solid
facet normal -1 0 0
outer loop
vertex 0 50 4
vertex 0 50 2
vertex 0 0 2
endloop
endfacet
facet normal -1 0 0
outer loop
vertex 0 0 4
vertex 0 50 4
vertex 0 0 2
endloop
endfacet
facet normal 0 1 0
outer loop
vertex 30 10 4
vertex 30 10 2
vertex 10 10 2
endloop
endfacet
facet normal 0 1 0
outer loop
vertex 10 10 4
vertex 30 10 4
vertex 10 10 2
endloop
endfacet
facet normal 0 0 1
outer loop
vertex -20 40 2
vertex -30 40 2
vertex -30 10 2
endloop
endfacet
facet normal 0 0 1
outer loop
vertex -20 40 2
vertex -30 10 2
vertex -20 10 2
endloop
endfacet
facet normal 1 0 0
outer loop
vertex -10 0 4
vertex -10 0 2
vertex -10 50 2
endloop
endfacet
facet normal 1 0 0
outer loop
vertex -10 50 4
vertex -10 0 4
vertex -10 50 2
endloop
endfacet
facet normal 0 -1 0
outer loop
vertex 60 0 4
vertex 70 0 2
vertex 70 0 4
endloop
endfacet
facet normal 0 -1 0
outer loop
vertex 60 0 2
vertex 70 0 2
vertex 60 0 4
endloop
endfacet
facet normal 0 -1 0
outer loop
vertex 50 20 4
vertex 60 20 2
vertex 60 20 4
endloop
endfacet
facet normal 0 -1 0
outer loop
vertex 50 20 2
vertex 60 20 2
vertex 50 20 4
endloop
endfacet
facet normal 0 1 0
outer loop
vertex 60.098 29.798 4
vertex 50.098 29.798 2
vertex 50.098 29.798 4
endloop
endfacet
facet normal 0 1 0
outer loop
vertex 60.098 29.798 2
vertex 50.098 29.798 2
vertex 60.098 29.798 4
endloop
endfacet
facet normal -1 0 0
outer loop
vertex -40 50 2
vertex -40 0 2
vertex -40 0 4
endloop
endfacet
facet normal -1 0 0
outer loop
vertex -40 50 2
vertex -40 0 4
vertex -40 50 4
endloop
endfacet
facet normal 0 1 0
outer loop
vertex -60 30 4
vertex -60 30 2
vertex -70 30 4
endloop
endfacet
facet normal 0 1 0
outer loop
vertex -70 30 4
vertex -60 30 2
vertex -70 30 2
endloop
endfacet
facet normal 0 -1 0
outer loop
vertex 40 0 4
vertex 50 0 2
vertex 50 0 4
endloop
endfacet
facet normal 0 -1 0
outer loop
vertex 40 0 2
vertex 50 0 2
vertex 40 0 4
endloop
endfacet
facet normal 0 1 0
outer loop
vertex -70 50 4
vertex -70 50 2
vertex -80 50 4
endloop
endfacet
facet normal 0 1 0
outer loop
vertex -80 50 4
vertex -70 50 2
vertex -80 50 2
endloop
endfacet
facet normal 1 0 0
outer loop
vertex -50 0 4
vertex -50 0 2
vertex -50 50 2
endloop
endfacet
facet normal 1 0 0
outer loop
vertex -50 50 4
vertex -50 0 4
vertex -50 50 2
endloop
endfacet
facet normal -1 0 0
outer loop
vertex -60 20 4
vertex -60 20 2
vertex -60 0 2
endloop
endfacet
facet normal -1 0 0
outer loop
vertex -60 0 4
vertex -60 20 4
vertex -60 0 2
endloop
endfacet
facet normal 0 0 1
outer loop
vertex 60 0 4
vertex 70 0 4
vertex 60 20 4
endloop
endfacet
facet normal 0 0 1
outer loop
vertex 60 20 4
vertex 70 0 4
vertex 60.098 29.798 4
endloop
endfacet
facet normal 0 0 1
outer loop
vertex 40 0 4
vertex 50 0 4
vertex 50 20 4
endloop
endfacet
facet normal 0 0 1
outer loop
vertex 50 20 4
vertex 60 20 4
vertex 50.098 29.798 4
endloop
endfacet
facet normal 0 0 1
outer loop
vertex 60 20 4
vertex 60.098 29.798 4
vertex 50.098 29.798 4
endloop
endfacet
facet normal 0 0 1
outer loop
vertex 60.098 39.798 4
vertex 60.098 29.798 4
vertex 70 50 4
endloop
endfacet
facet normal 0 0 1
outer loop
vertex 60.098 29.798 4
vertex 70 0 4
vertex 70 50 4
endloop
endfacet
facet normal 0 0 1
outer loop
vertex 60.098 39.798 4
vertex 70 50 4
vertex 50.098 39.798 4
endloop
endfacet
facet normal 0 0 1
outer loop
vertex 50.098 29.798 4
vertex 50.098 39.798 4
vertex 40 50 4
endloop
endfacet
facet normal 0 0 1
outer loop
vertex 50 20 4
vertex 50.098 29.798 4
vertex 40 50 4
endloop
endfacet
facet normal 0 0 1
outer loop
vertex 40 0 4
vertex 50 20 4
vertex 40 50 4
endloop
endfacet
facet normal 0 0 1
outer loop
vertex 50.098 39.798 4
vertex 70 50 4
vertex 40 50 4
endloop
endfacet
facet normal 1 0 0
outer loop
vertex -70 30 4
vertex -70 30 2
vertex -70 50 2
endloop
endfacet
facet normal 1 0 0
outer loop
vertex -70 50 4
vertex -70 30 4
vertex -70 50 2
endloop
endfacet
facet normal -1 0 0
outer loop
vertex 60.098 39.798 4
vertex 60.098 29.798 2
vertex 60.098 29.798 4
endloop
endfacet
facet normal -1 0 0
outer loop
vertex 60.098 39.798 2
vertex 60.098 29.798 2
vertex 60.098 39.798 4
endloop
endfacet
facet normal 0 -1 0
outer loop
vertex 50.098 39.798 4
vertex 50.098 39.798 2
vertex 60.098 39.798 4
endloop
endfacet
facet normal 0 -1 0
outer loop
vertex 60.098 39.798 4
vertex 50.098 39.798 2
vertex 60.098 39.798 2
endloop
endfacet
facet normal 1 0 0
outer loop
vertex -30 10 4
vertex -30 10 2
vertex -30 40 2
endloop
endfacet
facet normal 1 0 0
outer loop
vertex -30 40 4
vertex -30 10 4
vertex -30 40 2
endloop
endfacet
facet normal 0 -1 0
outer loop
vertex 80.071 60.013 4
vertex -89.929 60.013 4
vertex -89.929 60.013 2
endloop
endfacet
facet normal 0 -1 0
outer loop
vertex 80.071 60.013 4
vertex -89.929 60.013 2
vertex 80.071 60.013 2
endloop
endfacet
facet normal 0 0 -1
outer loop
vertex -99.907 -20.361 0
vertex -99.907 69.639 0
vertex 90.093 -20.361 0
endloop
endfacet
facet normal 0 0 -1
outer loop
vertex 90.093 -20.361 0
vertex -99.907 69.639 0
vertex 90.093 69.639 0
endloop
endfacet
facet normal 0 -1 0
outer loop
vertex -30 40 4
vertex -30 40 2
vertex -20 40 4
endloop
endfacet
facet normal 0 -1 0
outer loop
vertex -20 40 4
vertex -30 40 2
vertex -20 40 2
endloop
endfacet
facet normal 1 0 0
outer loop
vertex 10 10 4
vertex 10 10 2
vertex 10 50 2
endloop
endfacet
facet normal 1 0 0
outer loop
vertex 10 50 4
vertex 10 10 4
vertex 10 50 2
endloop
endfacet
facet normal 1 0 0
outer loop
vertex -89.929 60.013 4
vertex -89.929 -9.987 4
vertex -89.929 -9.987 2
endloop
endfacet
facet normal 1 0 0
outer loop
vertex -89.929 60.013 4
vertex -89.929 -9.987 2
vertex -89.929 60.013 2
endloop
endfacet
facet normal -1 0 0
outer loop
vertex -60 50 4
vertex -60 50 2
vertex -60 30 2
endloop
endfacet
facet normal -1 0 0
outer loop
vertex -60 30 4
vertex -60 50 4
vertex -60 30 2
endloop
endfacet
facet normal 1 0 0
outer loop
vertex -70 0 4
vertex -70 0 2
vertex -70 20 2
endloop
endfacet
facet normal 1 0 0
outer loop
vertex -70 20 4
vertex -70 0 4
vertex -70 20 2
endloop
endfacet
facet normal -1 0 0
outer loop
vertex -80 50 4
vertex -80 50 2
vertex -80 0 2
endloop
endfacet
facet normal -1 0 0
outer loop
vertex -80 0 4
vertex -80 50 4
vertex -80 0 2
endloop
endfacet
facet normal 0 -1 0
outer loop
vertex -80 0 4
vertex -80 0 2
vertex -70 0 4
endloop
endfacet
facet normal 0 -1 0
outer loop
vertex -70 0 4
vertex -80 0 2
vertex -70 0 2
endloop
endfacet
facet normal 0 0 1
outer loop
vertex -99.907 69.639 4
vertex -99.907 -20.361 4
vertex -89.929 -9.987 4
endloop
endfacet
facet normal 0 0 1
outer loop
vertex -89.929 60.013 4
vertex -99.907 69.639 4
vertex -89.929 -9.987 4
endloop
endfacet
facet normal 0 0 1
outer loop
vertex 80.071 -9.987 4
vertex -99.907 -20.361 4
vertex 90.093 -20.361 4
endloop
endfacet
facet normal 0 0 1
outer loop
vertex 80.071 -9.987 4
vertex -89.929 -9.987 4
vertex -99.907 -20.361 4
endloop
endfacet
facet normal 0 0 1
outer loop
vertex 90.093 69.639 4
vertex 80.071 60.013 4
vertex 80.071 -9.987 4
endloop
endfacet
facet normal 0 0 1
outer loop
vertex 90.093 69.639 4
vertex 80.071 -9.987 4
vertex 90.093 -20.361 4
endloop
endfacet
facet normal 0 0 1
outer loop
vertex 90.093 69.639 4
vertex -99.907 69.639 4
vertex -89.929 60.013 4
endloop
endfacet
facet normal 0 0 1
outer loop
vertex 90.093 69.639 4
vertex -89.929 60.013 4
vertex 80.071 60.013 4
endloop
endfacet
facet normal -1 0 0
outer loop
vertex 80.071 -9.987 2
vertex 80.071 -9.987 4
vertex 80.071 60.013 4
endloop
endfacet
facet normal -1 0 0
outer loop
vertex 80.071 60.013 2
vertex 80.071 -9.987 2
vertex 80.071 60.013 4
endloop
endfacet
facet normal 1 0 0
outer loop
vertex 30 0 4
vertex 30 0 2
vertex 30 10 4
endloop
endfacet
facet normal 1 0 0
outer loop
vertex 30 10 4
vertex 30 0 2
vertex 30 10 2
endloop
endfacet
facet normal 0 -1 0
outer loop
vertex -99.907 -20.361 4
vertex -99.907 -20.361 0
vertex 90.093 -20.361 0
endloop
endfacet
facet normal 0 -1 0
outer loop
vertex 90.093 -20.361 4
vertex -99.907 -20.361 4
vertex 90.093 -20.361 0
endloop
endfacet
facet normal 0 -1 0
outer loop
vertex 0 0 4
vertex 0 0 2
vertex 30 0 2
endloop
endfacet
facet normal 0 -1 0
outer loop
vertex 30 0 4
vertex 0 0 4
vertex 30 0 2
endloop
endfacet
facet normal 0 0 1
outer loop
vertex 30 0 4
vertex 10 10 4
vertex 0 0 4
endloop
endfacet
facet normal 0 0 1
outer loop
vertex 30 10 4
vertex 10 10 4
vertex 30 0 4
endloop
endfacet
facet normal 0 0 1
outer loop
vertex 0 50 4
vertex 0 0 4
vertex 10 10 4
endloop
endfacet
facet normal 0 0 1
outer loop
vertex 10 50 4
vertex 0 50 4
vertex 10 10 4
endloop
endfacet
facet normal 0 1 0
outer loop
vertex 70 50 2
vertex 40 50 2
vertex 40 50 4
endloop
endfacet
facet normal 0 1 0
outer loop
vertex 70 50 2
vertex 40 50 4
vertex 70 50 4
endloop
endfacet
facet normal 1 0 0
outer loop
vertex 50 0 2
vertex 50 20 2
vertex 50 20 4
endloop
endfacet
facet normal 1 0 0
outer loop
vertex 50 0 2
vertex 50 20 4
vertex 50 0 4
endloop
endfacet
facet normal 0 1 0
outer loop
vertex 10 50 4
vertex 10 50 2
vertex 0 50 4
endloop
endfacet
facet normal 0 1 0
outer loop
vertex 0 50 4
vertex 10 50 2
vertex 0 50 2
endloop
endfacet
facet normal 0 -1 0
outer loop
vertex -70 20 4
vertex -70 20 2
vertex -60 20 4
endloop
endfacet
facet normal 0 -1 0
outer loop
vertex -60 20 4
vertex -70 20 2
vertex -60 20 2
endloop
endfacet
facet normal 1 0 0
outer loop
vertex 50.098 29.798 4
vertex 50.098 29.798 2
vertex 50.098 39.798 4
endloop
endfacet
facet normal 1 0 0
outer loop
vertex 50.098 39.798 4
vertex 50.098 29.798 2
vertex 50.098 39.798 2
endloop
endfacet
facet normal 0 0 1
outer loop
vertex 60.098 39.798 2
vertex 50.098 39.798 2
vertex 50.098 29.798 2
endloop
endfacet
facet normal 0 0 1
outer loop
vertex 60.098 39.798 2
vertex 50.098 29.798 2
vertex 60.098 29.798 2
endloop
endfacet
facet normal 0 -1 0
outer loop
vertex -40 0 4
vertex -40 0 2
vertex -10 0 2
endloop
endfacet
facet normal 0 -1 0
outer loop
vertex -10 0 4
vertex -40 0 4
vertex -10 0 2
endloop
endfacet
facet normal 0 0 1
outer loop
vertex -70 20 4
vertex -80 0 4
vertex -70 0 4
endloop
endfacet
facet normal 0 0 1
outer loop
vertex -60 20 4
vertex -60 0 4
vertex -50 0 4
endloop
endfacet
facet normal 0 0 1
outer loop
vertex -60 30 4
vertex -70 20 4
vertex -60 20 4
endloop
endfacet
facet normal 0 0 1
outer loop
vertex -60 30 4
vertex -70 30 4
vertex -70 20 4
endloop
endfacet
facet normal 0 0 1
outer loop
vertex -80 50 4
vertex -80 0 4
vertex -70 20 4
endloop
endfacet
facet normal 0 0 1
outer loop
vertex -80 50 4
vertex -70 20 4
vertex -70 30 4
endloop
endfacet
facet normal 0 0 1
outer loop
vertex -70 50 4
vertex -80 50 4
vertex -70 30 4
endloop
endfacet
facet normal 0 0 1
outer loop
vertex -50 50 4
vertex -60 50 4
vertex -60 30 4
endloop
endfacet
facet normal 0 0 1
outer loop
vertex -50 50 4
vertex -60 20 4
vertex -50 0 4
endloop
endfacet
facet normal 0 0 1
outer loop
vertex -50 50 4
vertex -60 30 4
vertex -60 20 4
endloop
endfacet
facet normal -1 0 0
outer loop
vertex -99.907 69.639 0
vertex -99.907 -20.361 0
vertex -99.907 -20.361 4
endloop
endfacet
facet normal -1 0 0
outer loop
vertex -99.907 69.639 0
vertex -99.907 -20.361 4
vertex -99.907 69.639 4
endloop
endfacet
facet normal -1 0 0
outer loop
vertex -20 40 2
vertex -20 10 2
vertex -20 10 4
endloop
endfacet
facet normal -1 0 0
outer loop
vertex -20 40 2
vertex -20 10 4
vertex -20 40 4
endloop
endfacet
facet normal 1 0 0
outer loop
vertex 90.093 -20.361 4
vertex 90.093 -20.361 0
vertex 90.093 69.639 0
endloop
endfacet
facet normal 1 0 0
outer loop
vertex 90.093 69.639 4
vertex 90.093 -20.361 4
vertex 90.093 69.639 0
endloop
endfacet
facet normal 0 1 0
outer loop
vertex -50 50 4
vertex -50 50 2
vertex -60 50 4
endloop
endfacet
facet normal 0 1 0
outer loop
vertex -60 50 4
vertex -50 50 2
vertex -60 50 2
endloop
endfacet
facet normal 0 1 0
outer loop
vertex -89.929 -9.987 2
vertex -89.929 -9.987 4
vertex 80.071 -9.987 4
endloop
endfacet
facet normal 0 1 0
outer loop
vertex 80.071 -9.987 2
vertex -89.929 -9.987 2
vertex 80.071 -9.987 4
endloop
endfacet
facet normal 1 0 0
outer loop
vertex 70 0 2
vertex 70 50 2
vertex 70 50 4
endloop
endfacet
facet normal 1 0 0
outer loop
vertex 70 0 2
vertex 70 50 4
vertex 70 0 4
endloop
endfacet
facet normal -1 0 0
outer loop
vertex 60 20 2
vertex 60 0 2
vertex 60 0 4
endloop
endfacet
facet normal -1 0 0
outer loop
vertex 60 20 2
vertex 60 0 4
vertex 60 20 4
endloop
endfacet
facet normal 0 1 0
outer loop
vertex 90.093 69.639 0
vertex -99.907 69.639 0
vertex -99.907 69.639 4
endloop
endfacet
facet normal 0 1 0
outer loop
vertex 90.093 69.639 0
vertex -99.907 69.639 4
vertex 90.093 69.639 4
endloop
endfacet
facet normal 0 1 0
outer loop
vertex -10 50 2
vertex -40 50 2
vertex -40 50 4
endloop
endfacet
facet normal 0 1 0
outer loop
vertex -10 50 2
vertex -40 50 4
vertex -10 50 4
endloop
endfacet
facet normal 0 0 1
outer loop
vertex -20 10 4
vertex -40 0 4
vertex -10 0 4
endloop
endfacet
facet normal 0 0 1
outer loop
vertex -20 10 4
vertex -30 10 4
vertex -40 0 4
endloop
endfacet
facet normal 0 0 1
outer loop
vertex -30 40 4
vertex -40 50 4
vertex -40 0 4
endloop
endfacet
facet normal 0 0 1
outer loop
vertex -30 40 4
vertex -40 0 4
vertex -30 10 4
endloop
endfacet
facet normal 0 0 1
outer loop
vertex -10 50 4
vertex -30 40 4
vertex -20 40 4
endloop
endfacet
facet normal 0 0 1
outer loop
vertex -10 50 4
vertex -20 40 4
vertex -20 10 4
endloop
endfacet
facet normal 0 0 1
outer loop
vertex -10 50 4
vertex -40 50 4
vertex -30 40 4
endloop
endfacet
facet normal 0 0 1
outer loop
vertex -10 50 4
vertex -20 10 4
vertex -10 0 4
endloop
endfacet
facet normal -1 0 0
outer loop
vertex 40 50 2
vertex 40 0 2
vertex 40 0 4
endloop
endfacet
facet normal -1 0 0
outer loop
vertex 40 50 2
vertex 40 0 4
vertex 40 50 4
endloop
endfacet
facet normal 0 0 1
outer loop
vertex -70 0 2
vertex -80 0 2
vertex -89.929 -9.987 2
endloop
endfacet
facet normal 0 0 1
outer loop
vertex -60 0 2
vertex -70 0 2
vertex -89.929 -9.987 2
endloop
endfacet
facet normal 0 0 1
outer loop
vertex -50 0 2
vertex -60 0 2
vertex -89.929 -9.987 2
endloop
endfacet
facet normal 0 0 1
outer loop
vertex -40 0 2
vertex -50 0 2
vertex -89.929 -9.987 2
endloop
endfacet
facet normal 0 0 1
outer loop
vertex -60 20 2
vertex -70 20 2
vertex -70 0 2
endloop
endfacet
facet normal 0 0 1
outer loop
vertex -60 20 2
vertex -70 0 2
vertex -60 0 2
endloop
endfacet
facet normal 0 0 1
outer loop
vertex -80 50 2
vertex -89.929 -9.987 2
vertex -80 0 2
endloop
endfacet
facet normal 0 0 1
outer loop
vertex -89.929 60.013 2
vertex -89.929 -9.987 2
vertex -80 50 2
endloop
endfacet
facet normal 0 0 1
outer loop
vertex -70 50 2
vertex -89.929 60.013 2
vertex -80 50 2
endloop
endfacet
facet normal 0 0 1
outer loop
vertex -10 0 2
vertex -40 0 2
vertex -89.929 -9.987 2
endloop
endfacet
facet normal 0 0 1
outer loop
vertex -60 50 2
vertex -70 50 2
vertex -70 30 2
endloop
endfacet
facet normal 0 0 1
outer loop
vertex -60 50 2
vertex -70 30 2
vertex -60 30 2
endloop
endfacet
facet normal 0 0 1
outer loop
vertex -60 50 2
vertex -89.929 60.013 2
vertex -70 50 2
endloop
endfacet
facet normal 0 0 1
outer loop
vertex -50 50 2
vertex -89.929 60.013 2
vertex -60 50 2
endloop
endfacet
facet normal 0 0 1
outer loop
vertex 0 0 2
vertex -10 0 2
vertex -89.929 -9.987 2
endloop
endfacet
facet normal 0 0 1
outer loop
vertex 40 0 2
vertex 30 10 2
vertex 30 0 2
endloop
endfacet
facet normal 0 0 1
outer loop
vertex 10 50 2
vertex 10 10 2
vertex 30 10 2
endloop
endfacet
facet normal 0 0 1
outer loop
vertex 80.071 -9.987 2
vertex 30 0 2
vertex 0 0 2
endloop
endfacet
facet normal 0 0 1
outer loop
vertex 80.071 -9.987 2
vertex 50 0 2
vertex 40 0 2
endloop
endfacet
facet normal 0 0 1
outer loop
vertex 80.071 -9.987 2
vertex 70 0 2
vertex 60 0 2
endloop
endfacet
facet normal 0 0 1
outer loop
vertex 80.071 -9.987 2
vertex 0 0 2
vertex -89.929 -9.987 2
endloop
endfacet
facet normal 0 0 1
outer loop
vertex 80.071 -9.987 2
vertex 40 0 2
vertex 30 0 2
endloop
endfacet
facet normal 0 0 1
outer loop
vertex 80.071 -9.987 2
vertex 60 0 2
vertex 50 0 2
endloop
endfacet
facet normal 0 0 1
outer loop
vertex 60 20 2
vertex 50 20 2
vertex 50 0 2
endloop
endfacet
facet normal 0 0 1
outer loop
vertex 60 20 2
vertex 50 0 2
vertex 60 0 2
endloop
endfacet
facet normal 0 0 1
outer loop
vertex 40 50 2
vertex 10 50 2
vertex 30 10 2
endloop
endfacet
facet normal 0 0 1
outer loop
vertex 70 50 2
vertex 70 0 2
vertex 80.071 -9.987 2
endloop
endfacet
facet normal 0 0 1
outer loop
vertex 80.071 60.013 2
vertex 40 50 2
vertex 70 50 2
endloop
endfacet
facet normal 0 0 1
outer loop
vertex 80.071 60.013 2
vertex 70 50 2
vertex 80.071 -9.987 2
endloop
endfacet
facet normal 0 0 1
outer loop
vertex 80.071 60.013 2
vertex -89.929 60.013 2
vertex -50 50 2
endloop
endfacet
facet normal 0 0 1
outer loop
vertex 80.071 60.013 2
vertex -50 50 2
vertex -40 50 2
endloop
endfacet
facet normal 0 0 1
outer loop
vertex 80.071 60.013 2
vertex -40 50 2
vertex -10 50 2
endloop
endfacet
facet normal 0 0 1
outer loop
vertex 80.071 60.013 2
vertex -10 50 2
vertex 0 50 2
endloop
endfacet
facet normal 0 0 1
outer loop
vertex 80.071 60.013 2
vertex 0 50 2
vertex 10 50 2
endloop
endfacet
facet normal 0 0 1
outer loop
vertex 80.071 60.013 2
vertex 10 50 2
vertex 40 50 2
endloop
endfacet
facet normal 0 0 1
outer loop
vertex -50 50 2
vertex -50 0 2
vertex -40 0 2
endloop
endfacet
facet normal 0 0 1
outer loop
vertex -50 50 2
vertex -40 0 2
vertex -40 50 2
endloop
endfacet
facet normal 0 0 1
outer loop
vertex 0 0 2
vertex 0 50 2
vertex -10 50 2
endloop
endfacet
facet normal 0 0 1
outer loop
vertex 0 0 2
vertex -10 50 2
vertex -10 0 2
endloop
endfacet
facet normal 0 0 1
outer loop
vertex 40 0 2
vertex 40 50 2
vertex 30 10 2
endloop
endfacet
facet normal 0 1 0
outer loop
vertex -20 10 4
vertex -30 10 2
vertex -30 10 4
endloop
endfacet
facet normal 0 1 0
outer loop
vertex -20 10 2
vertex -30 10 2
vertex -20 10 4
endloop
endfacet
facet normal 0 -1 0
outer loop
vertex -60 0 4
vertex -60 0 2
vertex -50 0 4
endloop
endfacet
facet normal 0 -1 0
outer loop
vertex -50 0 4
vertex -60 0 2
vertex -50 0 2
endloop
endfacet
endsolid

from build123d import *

# Parameters (mm, degrees)
SKETCH003_W   = 10
SKETCH003_H   = 10
PAD003_DEPTH  = 2
SKETCH001_W   = 30
SKETCH001_H   = 50
SKETCH001_W_2 = 10
SKETCH001_H_2 = 30
PAD001_DEPTH  = 2
PAD002_DEPTH  = 2
PAD_DEPTH     = 2
SKETCH004_W   = 190
SKETCH004_H   = 90
PAD004_DEPTH  = 4
SKETCH005_W   = 170
SKETCH005_H   = 70
POCKET_DEPTH  = 2


with BuildPart() as letra_a:
    # Sketch003 → Pad003 (new body)
    with BuildSketch(Plane(origin=(40, 0, 0), x_dir=(1, 0, 0), z_dir=(0, 0, 1))):
        Polygon((0, 0), (0, 50), (30, 50), (30, 0), (20, 0), (20, 20), (10, 20), (10, 0), align=None)
        with Locations((15.098105, 34.798059)):
            Rectangle(SKETCH003_W, SKETCH003_H, mode=Mode.SUBTRACT)
    extrude(amount=PAD003_DEPTH)


with BuildPart() as letra_o:
    # Sketch001 → Pad001 (new body)
    with BuildSketch(Plane(origin=(-40, 0, 0), x_dir=(1, 0, 0), z_dir=(0, 0, 1))):
        with Locations((15, 25)):
            Rectangle(SKETCH001_W, SKETCH001_H)
        with Locations((15, 25)):
            Rectangle(SKETCH001_W_2, SKETCH001_H_2, mode=Mode.SUBTRACT)
    extrude(amount=PAD001_DEPTH)


with BuildPart() as letra_l:
    # Sketch002 → Pad002 (new body)
    with BuildSketch(Plane.XY):
        Polygon((0, 50), (0, 0), (30, 0), (30, 10), (10, 10), (10, 50), align=None)
    extrude(amount=PAD002_DEPTH)


with BuildPart() as hola:
    # Sketch → Pad (new body)
    with BuildSketch(Plane(origin=(-80, 0, 0), x_dir=(1, 0, 0), z_dir=(0, 0, 1))):
        Polygon((0, 0), (10, 0), (10, 20), (20, 20), (20, 0), (30, 0), (30, 50), (20, 50), (20, 30), (10, 30), (10, 50), (0, 50), align=None)
    extrude(amount=PAD_DEPTH)

    # Fusion: union Letra-A, Letra-O, Letra-L
    add(letra_a.part)
    add(letra_o.part)
    add(letra_l.part)


with BuildPart() as hola_1:
    # Fusion placement: moved
    add(hola.part.moved(Location((0, 0, 2))))


with BuildPart() as fusion001:
    # Sketch004 → Pad004 (new body)
    with BuildSketch(Plane.XY):
        with Locations((-4.907433, 24.638643)):
            Rectangle(SKETCH004_W, SKETCH004_H)
    extrude(amount=PAD004_DEPTH)

    # Sketch005 → Pocket (cut)
    with BuildSketch(Plane.XY.offset(4)):
        with Locations((-4.929122, 25.012712)):
            Rectangle(SKETCH005_W, SKETCH005_H)
    extrude(amount=-POCKET_DEPTH, mode=Mode.SUBTRACT)

    # Fusion001: union HOLA
    add(hola_1.part)


solid = fusion001.part
